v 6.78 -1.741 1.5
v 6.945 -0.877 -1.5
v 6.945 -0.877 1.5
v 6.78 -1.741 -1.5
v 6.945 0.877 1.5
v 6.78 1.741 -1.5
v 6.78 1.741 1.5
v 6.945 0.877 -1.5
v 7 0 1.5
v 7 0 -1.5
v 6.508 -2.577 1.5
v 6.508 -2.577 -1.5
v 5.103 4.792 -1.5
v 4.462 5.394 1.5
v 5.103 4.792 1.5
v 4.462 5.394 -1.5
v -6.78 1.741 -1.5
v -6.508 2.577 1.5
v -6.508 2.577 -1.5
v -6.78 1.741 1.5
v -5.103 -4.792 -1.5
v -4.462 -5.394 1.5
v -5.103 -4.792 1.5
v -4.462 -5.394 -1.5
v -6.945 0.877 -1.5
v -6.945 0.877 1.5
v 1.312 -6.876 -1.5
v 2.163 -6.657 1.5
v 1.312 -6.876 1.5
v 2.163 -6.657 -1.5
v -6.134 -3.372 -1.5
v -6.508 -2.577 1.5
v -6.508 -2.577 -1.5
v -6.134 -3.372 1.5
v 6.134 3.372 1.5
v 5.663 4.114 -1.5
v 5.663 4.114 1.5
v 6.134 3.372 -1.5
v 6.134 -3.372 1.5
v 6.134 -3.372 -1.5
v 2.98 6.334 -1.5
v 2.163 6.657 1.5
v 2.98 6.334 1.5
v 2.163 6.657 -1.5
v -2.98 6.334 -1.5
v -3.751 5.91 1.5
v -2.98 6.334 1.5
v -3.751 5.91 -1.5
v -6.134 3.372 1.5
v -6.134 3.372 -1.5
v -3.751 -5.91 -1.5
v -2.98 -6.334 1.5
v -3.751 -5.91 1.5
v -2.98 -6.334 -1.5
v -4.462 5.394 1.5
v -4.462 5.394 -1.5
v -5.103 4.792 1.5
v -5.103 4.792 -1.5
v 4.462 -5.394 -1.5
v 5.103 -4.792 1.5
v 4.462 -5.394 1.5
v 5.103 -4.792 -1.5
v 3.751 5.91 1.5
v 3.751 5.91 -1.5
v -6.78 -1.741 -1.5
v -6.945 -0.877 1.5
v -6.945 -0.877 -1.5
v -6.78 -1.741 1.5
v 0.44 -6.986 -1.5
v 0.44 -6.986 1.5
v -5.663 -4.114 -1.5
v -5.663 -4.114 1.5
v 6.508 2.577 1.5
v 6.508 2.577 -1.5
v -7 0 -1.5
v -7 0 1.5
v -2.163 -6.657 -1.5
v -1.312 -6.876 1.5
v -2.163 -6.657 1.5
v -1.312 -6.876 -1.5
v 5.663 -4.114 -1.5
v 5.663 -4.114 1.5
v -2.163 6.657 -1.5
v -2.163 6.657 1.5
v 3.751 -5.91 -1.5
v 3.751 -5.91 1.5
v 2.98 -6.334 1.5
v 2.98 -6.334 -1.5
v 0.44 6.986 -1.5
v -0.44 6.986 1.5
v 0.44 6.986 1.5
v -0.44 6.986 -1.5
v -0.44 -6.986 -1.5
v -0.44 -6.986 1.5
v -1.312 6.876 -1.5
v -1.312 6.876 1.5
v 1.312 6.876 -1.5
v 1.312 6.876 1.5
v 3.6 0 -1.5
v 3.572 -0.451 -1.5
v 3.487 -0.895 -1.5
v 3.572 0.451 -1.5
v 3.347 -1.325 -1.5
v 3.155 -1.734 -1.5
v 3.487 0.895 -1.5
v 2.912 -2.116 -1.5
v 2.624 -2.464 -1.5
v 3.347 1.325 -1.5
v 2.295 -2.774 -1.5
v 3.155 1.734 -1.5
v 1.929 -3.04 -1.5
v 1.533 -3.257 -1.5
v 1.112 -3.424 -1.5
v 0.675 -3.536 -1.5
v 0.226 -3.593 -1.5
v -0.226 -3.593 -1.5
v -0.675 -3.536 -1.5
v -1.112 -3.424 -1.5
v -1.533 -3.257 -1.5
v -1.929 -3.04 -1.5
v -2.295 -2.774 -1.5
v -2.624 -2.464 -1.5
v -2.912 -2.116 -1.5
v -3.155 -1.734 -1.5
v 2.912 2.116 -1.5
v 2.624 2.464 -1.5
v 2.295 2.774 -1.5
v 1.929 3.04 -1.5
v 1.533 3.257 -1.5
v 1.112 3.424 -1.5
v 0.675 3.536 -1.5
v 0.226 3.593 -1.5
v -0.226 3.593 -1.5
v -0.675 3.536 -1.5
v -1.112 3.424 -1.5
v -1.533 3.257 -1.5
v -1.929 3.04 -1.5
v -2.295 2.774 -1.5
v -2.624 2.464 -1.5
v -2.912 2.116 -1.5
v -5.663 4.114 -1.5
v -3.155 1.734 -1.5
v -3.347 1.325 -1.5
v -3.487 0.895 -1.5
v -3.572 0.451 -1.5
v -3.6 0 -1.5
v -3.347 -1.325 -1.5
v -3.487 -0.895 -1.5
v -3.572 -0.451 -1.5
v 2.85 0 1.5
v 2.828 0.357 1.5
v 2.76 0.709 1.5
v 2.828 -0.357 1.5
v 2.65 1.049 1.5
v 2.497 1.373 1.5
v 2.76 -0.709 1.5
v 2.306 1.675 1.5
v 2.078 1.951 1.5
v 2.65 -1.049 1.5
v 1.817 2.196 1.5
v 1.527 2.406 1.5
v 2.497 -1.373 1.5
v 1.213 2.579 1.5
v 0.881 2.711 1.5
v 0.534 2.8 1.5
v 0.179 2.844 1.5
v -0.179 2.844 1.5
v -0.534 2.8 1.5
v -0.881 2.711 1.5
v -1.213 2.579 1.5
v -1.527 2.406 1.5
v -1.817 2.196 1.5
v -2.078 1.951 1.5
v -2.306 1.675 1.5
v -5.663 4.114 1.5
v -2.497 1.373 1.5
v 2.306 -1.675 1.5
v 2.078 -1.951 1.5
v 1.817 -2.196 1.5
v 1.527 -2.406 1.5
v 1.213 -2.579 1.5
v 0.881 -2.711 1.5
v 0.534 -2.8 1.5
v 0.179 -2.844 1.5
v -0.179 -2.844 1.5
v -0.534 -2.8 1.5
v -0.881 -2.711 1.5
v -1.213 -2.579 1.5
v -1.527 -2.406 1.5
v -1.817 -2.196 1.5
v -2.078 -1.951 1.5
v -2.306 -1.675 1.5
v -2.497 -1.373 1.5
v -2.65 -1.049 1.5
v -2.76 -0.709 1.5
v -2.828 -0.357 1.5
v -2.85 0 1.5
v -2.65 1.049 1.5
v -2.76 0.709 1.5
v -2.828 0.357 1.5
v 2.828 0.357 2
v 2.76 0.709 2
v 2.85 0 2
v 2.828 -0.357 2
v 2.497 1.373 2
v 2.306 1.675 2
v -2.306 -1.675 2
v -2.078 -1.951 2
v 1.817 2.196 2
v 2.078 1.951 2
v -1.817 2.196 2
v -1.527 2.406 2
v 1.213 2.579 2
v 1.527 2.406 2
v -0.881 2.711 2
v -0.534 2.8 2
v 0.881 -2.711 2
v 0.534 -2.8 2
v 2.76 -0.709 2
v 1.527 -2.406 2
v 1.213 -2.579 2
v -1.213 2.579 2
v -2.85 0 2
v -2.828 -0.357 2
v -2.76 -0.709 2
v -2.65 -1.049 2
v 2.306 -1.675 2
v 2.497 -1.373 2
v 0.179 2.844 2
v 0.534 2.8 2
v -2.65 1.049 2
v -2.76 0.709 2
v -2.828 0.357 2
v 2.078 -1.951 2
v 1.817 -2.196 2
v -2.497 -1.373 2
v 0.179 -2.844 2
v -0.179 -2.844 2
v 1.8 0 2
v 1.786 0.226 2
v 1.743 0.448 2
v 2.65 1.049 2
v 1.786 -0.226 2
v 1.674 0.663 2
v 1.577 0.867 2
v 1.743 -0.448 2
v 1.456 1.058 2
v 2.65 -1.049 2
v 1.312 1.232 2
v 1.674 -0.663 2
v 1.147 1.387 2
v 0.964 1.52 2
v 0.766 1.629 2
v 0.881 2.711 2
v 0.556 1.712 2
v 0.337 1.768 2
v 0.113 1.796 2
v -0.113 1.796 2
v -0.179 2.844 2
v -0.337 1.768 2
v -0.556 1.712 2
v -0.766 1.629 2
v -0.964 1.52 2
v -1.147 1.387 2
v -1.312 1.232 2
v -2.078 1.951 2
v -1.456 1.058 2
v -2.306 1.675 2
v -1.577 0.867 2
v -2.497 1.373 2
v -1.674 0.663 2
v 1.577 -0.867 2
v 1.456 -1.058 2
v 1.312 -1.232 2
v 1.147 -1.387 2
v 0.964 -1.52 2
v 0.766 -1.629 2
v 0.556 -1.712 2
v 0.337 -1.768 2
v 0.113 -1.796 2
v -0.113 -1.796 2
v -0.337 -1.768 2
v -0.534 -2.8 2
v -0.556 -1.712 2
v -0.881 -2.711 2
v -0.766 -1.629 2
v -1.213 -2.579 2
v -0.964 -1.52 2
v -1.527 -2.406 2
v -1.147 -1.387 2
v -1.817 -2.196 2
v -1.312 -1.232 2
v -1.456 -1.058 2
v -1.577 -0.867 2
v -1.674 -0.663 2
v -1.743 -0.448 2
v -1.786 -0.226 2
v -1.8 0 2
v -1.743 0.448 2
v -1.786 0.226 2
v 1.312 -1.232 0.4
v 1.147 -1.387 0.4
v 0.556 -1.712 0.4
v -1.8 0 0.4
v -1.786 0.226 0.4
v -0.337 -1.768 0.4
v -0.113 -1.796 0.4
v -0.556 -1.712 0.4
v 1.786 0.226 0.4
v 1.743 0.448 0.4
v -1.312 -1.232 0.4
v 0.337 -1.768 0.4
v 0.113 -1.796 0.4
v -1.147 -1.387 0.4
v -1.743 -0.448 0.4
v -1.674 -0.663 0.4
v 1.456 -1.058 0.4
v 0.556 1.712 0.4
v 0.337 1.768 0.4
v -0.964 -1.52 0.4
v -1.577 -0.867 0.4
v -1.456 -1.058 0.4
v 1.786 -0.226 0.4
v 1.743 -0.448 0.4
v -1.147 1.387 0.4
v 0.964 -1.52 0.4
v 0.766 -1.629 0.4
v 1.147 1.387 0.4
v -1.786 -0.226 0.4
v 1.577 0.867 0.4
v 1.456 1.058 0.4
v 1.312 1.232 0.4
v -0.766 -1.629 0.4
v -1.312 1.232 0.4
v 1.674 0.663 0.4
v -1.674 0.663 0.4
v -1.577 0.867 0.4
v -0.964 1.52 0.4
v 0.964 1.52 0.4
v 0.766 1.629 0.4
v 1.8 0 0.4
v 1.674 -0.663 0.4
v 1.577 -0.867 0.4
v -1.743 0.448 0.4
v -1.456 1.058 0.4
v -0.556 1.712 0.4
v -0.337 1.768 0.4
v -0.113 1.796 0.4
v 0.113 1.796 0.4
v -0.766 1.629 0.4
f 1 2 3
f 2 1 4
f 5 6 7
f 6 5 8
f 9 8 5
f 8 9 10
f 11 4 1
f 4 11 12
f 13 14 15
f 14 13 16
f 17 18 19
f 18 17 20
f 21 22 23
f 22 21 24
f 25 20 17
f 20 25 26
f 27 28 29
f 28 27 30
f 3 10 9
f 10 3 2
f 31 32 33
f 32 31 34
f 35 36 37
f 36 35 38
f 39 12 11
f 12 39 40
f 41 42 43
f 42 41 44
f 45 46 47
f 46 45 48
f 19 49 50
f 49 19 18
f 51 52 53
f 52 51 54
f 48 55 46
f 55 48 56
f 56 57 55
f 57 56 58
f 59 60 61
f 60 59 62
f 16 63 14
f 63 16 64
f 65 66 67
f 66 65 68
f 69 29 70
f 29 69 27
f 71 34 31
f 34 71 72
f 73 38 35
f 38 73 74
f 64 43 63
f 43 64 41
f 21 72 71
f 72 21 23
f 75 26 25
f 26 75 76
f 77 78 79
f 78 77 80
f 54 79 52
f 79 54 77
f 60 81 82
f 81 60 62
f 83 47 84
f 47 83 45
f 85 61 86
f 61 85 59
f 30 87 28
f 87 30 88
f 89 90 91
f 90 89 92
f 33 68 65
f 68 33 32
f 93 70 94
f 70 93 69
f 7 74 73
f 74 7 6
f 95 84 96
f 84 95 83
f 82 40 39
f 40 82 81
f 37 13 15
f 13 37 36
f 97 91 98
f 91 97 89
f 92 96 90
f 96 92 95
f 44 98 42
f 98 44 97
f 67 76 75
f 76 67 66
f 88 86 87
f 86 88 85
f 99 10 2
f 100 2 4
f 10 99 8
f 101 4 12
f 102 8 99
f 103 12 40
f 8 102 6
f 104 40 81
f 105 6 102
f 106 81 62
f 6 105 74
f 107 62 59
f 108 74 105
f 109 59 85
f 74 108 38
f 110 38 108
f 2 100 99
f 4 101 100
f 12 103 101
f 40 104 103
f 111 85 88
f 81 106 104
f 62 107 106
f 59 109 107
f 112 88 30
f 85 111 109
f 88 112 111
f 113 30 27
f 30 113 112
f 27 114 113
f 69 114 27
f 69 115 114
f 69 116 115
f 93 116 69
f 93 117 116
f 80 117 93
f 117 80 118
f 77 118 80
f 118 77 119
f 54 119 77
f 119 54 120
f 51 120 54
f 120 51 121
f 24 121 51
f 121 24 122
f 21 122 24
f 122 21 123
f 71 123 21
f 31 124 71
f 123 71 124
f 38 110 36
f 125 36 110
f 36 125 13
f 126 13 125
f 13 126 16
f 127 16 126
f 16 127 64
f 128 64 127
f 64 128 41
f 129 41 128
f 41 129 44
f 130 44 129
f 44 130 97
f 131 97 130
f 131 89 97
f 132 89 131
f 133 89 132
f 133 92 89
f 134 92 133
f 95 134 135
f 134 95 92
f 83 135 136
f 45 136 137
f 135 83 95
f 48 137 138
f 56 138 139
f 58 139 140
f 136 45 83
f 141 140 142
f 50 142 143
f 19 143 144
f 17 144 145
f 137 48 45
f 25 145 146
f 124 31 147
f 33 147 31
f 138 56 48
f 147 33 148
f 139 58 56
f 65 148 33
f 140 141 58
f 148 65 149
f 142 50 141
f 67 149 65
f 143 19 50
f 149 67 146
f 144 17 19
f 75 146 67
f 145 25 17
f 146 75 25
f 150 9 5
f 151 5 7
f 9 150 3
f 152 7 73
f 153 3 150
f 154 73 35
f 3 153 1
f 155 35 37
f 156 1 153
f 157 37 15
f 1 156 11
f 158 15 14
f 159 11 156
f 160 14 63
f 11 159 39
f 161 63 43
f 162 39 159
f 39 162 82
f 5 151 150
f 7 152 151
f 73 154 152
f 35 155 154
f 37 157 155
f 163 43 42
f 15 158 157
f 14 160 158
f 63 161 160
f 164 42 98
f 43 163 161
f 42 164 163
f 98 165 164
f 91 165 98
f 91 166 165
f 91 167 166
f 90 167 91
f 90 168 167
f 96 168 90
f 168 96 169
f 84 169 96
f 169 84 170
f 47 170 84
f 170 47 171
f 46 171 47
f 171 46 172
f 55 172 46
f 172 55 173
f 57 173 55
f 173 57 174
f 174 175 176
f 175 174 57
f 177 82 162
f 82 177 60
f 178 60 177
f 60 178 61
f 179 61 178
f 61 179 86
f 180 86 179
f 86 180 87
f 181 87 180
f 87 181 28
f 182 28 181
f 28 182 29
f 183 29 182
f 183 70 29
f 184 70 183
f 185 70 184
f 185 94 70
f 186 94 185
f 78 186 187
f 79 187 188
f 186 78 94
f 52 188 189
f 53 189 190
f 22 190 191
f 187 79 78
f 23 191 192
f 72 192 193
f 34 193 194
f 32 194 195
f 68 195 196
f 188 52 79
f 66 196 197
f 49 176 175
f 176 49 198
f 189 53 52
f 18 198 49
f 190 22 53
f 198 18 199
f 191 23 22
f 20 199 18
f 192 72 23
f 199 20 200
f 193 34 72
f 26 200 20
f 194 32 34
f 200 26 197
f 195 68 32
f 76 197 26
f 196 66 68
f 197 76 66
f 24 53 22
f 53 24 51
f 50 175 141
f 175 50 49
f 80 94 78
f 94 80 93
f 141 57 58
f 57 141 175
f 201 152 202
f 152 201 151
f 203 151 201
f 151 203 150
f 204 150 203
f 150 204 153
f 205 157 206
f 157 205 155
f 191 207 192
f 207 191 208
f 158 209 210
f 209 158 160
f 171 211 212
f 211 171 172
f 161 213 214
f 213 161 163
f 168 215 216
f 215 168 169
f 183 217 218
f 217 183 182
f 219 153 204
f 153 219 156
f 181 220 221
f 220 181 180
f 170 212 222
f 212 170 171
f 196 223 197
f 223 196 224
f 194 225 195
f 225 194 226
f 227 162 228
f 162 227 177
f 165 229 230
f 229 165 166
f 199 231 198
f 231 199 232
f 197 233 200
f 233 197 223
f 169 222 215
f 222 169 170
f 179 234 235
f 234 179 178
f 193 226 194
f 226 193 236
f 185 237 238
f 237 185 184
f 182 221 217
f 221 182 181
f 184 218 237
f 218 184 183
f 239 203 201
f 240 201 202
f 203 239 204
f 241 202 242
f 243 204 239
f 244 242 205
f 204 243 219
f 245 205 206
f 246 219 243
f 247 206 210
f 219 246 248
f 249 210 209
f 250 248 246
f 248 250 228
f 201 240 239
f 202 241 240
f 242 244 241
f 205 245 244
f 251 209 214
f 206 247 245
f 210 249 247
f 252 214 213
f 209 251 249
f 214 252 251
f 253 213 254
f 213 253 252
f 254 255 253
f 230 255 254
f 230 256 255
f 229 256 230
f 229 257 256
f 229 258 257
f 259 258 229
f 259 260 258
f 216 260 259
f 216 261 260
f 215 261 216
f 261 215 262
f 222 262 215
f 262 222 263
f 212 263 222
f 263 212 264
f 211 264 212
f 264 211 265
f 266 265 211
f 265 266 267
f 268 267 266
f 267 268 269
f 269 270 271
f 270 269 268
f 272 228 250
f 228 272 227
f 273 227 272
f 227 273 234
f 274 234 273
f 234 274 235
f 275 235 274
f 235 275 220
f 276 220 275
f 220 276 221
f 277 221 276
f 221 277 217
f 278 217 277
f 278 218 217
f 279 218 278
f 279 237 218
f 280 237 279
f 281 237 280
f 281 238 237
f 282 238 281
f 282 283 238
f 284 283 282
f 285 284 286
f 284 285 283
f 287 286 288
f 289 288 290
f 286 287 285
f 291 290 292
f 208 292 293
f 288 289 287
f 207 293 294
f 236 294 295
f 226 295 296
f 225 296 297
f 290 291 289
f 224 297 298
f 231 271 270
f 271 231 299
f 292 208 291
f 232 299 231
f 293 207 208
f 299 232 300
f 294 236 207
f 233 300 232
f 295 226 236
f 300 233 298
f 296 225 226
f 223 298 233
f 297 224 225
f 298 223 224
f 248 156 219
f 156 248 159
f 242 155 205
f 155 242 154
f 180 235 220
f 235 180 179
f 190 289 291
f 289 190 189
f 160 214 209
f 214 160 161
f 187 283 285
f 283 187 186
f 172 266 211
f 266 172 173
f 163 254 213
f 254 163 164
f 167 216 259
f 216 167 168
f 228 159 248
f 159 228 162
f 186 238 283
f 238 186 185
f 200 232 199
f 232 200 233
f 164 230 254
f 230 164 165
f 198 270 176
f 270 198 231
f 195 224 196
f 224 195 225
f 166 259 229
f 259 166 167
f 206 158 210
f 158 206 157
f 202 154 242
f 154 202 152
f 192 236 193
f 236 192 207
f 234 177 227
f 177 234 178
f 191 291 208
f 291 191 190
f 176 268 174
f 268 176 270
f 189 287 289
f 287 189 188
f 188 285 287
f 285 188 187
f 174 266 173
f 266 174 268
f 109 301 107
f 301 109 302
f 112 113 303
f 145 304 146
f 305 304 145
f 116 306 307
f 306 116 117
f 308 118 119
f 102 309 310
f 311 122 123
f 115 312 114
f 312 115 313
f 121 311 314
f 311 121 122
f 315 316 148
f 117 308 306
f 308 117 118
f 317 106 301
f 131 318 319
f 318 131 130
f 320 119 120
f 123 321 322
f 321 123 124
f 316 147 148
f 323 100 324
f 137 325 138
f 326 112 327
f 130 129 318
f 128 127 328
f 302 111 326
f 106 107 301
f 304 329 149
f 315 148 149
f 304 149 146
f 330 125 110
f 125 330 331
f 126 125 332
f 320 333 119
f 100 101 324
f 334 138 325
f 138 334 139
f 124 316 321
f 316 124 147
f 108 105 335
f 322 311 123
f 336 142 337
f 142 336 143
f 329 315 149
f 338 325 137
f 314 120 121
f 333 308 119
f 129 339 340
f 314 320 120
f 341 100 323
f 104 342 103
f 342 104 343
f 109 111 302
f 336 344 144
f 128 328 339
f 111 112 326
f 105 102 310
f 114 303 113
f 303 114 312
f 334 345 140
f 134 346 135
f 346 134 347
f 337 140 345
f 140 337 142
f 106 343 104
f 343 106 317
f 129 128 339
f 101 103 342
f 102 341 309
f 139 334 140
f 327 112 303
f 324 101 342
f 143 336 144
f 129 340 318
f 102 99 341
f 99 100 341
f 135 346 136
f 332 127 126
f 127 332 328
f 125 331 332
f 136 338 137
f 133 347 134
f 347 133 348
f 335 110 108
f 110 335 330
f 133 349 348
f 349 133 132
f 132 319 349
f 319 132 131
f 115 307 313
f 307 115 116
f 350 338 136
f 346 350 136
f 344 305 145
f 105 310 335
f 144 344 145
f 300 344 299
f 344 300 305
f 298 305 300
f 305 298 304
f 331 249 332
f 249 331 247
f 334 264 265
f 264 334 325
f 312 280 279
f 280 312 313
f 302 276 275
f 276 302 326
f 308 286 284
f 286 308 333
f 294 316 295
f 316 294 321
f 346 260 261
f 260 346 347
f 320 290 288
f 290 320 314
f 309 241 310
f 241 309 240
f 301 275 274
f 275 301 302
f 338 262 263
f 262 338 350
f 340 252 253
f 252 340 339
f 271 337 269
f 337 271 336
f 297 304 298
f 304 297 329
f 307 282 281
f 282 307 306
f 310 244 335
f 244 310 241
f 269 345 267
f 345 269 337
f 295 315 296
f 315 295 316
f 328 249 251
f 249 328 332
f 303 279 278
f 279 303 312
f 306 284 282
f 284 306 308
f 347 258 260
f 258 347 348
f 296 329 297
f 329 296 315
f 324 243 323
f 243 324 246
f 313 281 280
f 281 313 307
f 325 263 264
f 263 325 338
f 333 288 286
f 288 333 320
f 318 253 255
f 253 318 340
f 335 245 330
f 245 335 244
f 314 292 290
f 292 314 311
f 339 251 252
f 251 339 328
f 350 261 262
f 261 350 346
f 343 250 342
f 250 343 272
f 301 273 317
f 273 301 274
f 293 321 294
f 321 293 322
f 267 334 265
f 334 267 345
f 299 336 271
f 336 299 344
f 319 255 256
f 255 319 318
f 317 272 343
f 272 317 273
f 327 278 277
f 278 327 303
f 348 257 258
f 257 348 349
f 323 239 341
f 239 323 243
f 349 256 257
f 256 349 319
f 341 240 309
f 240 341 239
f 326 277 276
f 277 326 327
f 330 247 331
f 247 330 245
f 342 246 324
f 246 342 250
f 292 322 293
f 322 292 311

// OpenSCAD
$fn = 50;


difference() {
	union() {
		translate(v = [0, 0, -1.5000000000]) {
			cylinder(h = 3, r = 7.0000000000);
		}
		translate(v = [0, 0, -1.5000000000]) {
			cylinder(h = 3.5000000000, r = 2.8500000000);
		}
	}
	union() {
		translate(v = [0, 0, -1.5000000000]) {
			rotate(a = [0, 180, 0]) {
				difference() {
					union() {
						translate(v = [0, 0, -3.5000000000]) {
							cylinder(h = 3.5000000000, r = 1.5000000000);
						}
						translate(v = [0, 0, -1.9000000000]) {
							cylinder(h = 1.9000000000, r1 = 1.8000000000, r2 = 3.6000000000);
						}
						translate(v = [0, 0, -3.5000000000]) {
							cylinder(h = 3.5000000000, r = 1.8000000000);
						}
						translate(v = [0, 0, -3.5000000000]) {
							cylinder(h = 3.5000000000, r = 1.5000000000);
						}
					}
					union();
				}
			}
		}
		translate(v = [0, 0, -50.0000000000]) {
			cylinder(h = 100, r = 1.8000000000);
		}
	}
}
